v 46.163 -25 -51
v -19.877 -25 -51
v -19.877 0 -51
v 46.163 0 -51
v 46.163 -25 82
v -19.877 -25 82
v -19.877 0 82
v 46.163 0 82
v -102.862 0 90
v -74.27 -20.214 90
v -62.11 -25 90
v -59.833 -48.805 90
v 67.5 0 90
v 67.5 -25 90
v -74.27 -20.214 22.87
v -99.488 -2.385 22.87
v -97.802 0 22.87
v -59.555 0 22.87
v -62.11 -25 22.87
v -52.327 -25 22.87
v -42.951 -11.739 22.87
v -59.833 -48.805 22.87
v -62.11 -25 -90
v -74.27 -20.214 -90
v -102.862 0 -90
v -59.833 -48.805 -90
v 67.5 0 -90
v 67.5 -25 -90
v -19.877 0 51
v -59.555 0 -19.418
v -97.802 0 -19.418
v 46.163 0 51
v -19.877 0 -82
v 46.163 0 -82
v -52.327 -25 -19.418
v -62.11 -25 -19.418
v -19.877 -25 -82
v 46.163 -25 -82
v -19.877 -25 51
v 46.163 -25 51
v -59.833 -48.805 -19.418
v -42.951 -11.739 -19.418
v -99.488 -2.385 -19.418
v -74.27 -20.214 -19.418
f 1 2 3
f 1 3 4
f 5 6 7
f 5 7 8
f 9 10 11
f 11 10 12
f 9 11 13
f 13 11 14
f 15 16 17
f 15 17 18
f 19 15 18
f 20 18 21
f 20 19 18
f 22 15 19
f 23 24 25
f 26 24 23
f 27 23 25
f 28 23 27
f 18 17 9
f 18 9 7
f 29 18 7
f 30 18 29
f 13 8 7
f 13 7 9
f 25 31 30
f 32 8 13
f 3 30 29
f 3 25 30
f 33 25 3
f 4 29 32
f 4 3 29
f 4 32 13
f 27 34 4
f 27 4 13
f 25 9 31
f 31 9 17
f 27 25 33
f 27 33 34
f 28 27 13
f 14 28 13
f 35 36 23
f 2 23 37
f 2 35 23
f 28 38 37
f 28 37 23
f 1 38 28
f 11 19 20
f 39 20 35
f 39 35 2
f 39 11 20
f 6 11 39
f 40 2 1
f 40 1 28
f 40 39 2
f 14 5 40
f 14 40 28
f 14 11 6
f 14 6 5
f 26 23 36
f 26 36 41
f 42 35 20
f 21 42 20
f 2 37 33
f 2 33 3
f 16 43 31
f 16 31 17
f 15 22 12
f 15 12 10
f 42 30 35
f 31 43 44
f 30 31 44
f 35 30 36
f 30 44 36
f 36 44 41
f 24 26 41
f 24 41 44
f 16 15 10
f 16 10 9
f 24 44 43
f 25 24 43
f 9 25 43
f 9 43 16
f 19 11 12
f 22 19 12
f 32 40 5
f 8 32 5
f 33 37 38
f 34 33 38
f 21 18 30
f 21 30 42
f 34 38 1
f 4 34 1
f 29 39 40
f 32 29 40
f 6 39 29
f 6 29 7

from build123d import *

# Parameters (mm, degrees)
F0_W     = 135
F0_H     = 180
F1_DEPTH = 25
F3_DEPTH = 180
F4_W     = 51.5650697052
F4_H     = 42.2876738012
F5_DEPTH = 25
F6_W     = 66.04
F6_H     = 31
F7_DEPTH = 25
F8_W     = 32.0292665178
F8_H     = 42.2876738012
F9_DEPTH = 10


# Not quite as in the source:
# - a feature names something its author has since deleted; it is built from what else it names


with BuildPart() as f1:
    # F0 (on Front) → F1 (new body)
    with BuildSketch(Plane.XZ):
        Rectangle(F0_W, F0_H)
    extrude(amount=F1_DEPTH)

    # F2 (on face) → F3 (join)
    with BuildSketch(Plane(origin=(0, 0, -90), x_dir=(1, 0, 0), z_dir=(0, 0, -1))):
        Polygon((-74.269764297, 20.2139050914), (-67.5, 25), (-62.1096342802, 25), (-59.8334595561, 48.8052852452), align=None)
        Polygon((-67.5, 0), (-67.5, 25), (-74.269764297, 20.2139050914), (-102.8616279364, 0), align=None)
    extrude(amount=-F3_DEPTH)

    # F4 (on face) → F5 (cut)
    with BuildSketch(Plane(origin=(-34.2790786746, -48.4865610438, 0), x_dir=(0.8165449841, -0.5772818107, 0), z_dir=(-0.5772818107, -0.8165449841, 0))):
        with Locations((-54.0774967521, 1.7260275781)):
            Rectangle(F4_W, F4_H)
    extrude(amount=-F5_DEPTH, mode=Mode.SUBTRACT)

    # F6 (on face) → F7 (cut)
    with BuildSketch(Plane.XZ.offset(25)):
        with Locations((13.1429424509, 66.5)):
            Rectangle(F6_W, F6_H)
        with Locations((13.1429424509, -66.5)):
            Rectangle(F6_W, F6_H)
    extrude(amount=-F7_DEPTH, mode=Mode.SUBTRACT)

    # F8 (on face) → F9 (cut)
    with BuildSketch(Plane(origin=(-67.3147543785, -33.9884364638, 0), x_dir=(0.4507223021, -0.8926642181, 0), z_dir=(-0.8926642181, -0.4507223021, 0))):
        with Locations((0.5838238992, 1.7260275781)):
            Rectangle(F8_W, F8_H)
    extrude(amount=-F9_DEPTH, mode=Mode.SUBTRACT)


solid = f1.part
